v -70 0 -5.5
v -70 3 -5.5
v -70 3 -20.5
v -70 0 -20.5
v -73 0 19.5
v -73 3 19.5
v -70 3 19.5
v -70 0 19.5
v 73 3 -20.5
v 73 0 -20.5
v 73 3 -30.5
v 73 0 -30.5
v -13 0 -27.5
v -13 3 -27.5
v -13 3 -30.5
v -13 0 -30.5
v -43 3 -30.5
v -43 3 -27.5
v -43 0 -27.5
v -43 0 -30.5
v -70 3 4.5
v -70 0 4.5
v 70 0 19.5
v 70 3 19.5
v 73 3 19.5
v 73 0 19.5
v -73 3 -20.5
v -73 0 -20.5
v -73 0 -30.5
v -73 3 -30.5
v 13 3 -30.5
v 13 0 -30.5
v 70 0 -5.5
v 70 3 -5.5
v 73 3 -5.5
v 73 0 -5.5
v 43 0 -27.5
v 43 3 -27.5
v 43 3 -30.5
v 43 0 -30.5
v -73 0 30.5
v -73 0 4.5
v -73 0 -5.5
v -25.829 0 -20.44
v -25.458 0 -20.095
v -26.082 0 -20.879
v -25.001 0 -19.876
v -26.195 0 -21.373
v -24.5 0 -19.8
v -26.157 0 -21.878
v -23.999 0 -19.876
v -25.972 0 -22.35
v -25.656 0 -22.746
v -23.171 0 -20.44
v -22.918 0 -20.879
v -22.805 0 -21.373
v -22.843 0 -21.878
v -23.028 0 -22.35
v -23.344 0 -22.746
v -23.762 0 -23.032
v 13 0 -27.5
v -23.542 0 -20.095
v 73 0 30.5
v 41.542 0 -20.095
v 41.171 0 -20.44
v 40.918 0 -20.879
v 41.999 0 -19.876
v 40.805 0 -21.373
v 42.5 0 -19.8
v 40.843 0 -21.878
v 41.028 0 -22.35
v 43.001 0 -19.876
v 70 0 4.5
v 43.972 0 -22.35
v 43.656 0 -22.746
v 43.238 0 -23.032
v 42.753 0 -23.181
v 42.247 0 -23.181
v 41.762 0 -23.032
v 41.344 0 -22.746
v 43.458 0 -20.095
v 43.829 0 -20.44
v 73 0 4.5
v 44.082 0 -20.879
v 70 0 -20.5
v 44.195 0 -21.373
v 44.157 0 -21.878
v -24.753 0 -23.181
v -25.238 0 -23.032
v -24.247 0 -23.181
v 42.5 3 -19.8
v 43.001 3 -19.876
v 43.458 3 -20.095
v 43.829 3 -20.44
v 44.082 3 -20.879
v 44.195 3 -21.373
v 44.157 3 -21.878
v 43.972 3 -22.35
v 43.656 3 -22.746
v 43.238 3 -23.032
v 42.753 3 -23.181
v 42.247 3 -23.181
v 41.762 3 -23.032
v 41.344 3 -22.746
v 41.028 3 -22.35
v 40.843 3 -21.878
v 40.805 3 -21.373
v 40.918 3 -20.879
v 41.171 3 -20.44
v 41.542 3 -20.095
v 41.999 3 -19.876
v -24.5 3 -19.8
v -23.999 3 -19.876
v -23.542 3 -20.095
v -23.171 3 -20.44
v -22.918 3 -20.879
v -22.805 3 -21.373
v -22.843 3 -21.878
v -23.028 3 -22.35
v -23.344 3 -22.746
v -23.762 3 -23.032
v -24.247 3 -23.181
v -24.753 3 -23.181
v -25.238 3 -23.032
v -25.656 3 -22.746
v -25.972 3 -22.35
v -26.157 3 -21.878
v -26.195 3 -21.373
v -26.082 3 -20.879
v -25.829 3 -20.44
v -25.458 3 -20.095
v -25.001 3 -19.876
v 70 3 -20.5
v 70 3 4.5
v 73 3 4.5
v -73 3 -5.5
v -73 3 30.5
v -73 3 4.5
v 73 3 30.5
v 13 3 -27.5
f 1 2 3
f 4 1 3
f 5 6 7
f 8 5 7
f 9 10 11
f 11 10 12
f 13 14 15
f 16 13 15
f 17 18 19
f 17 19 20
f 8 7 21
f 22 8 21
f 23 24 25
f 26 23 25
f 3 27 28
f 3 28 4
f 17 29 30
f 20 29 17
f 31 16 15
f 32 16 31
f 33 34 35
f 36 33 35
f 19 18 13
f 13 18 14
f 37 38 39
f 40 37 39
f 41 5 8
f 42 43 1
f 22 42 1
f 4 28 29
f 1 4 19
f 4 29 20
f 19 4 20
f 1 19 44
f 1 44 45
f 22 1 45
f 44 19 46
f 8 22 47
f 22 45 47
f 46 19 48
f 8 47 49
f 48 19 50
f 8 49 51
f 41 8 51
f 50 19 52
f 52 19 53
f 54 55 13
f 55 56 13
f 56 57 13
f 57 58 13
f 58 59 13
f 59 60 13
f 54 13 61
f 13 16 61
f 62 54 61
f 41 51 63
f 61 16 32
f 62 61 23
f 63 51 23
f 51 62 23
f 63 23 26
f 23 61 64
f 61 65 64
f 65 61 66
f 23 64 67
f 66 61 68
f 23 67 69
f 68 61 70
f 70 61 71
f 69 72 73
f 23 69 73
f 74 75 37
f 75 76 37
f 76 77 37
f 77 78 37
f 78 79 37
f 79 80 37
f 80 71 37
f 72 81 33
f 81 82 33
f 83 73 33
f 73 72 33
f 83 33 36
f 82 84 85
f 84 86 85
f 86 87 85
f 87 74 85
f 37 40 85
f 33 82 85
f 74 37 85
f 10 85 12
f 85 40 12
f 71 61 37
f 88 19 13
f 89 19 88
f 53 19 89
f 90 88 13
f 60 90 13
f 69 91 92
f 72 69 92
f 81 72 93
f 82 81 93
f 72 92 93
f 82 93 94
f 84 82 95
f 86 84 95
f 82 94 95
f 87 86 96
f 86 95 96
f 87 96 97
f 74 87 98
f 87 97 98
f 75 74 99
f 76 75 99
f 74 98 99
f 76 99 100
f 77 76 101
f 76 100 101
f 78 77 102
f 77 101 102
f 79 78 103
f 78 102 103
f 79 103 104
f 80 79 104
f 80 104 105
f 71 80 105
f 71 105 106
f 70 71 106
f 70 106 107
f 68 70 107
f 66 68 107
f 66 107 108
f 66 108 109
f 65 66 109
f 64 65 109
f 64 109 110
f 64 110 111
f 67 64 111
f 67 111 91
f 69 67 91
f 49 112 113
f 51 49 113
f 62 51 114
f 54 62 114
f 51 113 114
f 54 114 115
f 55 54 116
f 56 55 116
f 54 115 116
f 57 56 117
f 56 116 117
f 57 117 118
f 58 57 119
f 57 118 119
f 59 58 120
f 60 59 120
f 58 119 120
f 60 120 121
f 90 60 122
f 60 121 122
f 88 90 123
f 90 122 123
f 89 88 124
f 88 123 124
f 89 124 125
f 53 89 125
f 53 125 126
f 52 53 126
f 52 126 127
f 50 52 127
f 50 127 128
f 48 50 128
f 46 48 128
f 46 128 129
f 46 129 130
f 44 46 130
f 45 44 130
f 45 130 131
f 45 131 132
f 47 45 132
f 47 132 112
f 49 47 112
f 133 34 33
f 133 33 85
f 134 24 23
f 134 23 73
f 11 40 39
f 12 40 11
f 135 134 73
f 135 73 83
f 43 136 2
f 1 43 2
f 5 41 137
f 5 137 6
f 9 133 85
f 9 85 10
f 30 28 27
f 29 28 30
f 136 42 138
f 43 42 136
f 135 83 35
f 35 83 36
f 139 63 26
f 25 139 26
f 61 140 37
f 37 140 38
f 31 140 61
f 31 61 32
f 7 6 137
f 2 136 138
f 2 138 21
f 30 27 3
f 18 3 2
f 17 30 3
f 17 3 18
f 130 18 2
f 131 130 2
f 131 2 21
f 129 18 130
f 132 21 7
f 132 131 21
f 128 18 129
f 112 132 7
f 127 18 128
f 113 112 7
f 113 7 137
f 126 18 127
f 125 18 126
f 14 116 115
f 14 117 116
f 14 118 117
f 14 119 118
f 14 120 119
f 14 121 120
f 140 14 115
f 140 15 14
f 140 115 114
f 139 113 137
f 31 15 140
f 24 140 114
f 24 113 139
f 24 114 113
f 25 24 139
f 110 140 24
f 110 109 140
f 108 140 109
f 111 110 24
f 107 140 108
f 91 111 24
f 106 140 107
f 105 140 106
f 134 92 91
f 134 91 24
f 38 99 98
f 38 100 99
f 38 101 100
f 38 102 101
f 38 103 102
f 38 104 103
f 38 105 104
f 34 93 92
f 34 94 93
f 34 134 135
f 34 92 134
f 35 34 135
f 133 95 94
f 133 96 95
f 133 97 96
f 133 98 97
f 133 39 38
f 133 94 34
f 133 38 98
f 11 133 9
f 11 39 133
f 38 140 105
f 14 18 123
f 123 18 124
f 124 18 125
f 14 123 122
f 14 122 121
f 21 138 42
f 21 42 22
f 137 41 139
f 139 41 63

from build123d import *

# Parameters (mm, degrees)
SKETCH1_W           = 146
SKETCH1_H           = 61
BOSS_EXTRUDE1_DEPTH = 3
SKETCH2_R           = 1.7
SKETCH2_W           = 3
SKETCH2_H           = 15
SKETCH2_W_2         = 30
SKETCH2_H_2         = 3
CUT_EXTRUDE1_DEPTH  = 10


with BuildPart() as part:
    # Sketch1 → Boss-Extrude1 (new body)
    with BuildSketch(Plane(origin=(0, 0, 0), x_dir=(1, 0, 0), z_dir=(0, 1, 0))):
        Rectangle(SKETCH1_W, SKETCH1_H)
    extrude(amount=BOSS_EXTRUDE1_DEPTH)

    # Sketch2 → Cut-Extrude1 (cut)
    with BuildSketch(Plane(origin=(0, 3, 0), x_dir=(1, 0, 0), z_dir=(0, 1, 0))):
        with Locations(Location((-24.5, 21.5, 0), (0, 0, 270))):
            Circle(SKETCH2_R)
        with Locations(Location((42.5, 21.5, 0), (0, 0, 270))):
            Circle(SKETCH2_R)
        with Locations((-71.5, 13)):
            Rectangle(SKETCH2_W, SKETCH2_H)
        with Locations((-71.5, -12)):
            Rectangle(SKETCH2_W, SKETCH2_H)
        with Locations((71.5, 13)):
            Rectangle(SKETCH2_W, SKETCH2_H)
        with Locations((71.5, -12)):
            Rectangle(SKETCH2_W, SKETCH2_H)
        with Locations((-28, 29)):
            Rectangle(SKETCH2_W_2, SKETCH2_H_2)
        with Locations((28, 29)):
            Rectangle(SKETCH2_W_2, SKETCH2_H_2)
    extrude(amount=-CUT_EXTRUDE1_DEPTH, mode=Mode.SUBTRACT)


solid = part.part
